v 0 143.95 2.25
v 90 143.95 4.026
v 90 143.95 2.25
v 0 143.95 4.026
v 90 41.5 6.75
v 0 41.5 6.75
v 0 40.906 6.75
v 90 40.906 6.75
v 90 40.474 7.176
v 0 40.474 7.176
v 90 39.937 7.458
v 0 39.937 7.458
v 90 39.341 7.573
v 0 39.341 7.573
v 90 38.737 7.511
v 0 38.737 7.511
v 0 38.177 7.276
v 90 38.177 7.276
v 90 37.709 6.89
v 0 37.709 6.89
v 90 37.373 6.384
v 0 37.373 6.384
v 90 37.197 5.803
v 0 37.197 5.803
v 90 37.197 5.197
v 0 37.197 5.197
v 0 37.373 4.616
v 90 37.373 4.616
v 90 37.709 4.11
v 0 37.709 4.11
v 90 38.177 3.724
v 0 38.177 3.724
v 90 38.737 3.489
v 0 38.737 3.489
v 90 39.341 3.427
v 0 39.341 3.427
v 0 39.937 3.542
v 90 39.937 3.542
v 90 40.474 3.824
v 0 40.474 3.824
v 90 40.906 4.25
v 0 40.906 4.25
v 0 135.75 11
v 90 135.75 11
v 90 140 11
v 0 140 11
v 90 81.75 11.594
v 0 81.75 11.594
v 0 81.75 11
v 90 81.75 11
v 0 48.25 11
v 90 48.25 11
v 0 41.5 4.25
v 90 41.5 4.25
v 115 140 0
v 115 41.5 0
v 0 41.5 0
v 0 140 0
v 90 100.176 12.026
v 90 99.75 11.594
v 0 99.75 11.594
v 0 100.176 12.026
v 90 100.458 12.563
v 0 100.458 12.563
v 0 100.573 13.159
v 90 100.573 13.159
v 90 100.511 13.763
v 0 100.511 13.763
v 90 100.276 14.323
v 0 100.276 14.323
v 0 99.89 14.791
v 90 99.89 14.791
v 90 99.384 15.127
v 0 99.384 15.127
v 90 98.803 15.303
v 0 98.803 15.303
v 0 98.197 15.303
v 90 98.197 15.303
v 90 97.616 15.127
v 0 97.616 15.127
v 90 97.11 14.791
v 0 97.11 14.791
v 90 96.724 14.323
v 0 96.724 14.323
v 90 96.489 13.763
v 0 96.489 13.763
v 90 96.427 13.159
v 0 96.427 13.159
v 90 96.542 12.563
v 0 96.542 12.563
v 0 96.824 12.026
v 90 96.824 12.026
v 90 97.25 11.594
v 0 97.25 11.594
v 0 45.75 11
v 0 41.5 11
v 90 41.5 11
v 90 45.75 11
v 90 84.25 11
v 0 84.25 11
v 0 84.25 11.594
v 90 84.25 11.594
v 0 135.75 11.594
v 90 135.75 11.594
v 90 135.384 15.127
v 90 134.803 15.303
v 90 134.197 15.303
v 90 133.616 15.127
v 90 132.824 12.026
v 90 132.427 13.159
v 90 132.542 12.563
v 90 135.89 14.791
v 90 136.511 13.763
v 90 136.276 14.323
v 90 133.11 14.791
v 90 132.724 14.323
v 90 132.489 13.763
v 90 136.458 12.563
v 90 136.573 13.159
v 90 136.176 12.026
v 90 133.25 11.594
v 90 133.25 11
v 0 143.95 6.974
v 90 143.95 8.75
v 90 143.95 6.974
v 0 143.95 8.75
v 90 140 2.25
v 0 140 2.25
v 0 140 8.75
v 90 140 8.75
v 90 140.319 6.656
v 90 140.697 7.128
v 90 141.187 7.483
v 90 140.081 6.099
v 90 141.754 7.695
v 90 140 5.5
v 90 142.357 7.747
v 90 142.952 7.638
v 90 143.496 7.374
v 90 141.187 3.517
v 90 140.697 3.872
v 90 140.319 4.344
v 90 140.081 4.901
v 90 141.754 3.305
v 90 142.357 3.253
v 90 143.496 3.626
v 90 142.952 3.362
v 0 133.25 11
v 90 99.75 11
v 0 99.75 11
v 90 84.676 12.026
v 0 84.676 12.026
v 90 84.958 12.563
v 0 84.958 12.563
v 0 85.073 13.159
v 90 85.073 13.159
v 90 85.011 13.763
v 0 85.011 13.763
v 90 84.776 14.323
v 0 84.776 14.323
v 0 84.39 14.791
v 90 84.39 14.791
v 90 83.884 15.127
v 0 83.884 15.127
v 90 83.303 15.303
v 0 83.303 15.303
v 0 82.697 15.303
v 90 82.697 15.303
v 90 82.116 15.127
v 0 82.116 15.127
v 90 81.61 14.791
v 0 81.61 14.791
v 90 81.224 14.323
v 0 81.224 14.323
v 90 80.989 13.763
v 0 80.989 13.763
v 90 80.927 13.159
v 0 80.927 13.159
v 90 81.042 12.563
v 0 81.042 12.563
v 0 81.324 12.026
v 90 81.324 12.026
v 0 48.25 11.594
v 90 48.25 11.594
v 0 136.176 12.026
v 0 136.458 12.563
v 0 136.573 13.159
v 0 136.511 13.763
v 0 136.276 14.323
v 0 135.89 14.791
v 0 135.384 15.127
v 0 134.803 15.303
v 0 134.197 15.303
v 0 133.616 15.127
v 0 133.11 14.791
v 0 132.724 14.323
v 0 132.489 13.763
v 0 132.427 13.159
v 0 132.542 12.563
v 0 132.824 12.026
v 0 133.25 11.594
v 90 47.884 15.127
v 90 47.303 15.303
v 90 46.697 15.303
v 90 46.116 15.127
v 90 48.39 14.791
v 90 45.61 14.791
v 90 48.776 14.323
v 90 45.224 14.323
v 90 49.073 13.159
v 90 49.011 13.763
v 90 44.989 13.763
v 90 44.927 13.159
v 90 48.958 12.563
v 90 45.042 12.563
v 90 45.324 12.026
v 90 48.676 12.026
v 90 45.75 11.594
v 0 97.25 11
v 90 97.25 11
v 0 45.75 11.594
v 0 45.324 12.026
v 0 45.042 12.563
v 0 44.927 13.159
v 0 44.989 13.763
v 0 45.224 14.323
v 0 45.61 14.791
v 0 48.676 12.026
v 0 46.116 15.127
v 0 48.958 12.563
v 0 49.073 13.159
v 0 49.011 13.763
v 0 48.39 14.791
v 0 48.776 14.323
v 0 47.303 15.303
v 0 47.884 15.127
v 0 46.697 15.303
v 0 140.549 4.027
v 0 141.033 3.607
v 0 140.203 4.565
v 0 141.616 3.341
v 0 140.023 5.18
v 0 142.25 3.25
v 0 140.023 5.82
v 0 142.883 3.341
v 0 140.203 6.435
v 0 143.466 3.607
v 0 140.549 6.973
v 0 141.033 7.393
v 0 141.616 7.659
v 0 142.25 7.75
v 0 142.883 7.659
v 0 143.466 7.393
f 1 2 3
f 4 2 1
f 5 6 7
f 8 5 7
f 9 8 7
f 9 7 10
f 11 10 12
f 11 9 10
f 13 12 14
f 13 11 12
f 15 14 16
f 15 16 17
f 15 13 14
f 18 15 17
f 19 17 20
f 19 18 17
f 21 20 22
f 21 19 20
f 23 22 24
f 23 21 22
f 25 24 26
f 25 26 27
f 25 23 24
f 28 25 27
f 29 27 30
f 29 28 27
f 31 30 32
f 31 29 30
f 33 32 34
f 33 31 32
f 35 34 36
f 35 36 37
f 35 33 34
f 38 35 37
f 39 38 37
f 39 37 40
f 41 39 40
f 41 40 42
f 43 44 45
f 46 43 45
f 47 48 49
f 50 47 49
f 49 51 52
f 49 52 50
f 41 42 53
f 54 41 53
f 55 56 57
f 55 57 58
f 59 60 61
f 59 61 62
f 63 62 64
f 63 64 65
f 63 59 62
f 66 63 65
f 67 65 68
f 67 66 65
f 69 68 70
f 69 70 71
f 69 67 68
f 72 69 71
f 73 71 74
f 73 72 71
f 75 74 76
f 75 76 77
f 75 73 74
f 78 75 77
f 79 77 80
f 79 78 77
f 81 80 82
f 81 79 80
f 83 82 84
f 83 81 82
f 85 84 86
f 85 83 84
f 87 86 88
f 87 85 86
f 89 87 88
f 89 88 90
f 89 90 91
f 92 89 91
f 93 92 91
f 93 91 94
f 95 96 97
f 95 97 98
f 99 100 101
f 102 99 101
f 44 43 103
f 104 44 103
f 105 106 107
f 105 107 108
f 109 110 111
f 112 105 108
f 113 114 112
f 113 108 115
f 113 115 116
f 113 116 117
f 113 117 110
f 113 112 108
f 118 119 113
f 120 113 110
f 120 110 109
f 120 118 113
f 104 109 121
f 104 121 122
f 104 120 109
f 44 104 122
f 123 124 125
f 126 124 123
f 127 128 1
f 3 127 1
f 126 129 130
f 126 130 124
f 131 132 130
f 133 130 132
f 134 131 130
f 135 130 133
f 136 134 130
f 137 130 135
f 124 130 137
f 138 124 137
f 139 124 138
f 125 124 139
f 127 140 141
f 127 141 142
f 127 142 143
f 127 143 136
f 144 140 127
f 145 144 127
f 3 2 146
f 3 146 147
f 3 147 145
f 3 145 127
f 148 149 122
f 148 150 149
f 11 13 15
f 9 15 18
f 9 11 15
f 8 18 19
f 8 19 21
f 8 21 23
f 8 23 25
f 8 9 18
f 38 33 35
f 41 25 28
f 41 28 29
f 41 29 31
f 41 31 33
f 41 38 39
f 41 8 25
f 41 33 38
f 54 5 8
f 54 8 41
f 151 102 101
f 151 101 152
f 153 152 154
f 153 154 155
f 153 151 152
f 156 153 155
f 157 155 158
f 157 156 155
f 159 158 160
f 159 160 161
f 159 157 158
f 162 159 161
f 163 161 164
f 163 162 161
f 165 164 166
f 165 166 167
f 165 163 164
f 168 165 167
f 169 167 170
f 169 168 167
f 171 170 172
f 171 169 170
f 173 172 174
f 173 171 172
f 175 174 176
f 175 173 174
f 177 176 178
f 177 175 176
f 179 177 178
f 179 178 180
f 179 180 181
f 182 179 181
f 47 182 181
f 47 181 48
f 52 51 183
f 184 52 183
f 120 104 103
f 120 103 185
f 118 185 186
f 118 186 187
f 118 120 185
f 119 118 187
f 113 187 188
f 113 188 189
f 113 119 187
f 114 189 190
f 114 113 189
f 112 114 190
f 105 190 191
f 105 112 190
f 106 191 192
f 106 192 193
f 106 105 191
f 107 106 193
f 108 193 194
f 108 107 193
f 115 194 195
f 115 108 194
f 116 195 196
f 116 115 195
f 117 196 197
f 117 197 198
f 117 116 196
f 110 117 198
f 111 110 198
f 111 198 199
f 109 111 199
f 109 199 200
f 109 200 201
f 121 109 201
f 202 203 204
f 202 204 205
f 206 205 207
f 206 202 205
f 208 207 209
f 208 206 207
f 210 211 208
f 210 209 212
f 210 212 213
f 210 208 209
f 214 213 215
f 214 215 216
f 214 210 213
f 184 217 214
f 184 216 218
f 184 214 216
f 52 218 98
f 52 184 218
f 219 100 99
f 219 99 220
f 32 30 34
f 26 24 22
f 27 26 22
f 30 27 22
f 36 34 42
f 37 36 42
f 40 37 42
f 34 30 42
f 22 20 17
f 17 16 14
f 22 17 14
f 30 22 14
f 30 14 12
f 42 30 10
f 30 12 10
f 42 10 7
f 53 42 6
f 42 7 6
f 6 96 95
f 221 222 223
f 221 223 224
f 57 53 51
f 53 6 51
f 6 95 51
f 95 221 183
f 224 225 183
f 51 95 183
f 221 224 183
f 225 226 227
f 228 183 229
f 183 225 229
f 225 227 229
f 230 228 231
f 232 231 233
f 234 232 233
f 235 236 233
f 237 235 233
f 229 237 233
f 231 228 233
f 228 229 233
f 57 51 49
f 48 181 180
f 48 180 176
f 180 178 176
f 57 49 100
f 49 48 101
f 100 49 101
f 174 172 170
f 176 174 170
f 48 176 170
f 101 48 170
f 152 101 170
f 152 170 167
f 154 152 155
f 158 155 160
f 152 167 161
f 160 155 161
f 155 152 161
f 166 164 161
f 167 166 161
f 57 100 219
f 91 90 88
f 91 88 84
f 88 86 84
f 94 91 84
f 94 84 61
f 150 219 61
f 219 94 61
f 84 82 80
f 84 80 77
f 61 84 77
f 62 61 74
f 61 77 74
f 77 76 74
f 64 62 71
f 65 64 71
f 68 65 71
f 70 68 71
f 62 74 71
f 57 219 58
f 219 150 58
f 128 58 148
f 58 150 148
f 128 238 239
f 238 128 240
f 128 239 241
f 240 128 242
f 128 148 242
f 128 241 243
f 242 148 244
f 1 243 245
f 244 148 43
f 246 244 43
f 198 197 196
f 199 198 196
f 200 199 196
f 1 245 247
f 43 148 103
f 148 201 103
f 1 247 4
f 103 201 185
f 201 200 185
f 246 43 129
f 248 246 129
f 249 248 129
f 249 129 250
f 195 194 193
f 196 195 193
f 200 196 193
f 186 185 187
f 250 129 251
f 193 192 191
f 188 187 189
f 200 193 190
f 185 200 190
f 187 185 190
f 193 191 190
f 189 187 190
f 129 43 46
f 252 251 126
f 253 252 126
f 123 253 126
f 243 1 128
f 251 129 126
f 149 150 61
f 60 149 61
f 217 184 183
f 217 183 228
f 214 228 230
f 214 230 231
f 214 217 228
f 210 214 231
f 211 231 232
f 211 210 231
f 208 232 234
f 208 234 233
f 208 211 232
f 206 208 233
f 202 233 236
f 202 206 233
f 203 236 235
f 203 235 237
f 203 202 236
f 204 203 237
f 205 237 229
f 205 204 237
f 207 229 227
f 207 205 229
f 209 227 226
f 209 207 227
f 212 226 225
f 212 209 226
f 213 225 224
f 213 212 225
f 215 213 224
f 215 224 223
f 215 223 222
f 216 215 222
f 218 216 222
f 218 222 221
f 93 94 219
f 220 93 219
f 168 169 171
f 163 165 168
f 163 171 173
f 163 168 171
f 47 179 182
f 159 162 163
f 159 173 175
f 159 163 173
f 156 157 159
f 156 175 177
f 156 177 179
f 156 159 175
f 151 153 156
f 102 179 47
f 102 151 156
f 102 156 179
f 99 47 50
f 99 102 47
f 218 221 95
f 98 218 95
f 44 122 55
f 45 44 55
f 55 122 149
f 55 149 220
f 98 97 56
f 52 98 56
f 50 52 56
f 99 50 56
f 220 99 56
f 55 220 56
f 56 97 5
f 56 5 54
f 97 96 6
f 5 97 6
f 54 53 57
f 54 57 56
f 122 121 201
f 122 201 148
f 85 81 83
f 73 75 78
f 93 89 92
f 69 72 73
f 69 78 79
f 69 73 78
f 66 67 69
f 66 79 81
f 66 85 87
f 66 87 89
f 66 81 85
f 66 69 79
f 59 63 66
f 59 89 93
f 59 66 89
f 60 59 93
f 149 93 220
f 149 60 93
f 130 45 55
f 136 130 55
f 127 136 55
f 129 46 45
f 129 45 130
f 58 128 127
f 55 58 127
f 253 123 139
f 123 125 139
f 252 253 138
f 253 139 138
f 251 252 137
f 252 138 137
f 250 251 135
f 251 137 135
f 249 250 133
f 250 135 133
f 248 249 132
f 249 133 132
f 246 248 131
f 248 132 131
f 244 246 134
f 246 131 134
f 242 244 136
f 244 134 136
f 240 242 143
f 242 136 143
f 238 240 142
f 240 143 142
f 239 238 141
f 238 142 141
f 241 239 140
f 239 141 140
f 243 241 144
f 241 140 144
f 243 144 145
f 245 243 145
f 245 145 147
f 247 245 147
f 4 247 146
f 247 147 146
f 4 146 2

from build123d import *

# Parameters (mm, degrees)
EXTRUDE_1_DEPTH             = 90
SKETCH_2_W                  = 90
SKETCH_2_H                  = 17.75
EXTRUDE_2_DEPTH             = 8.2
SKETCH_3_W                  = 90
SKETCH_3_H                  = 102.45
EXTRUDE_3_DEPTH             = 8.2
SKETCH_4_W                  = 3.95
SKETCH_4_H                  = 2.25
CUT_EXTRUDE_1_DEPTH         = 171.45954982
SKETCH_5_W                  = 3.95
SKETCH_5_H                  = 29.5
CUT_EXTRUDE_2_DEPTH         = 171.45954982
SKETCH_6_W                  = 3.95
SKETCH_6_H                  = 9
CUT_EXTRUDE_3_DEPTH         = 171.45954982
SKETCH_7_W                  = 3.95
SKETCH_7_H                  = 29.5
CUT_EXTRUDE_4_DEPTH         = 171.45954982
SKETCH_8_W                  = 3.95
SKETCH_8_H                  = 6.2
CUT_EXTRUDE_5_DEPTH         = 171.45954982
SKETCH_9_W                  = 2.25
SKETCH_9_H                  = 3.95
CUT_EXTRUDE_6_DEPTH         = 171.45954982
SKETCH_10_W                 = 4.5
SKETCH_10_H                 = 3.95
CUT_EXTRUDE_7_DEPTH         = 171.45954982
SKETCH_11_W                 = 2.25
SKETCH_11_H                 = 3.95
CUT_EXTRUDE_8_DEPTH         = 171.45954982
SKETCH_12_W                 = 20.2
SKETCH_12_H                 = 96.7
CUT_EXTRUDE_9_DEPTH         = 86
HOLE_WIZARD_8_3_8_3_1_D     = 8.3
HOLE_WIZARD_8_3_8_3_1_DEPTH = 3.2
HOLE_WIZARD_4_5_4_5_1_D     = 4.5
HOLE_WIZARD_2_5_2_5_1_D     = 2.5
SKETCH_19_R                 = 4.5030807
EXTRUDE_4_DEPTH             = 3
SKETCH_20_R                 = 1.649948342
SKETCH_20_R_2               = 1.660581376
SKETCH_20_R_3               = 1.430745594
SKETCH_20_R_4               = 1.573250385
SKETCH_20_R_5               = 1.502029841
SKETCH_20_R_6               = 1.53795619
EXTRUDE_5_DEPTH             = 90
CUT_EXTRUDE_10_DEPTH        = 112
CUT_EXTRUDE_10_DEPTH_BACK   = 112
EXTRUDE_6_DEPTH             = 20
EXTRUDE_6_DEPTH_BACK        = 3
SKETCH_22_W                 = 10.1
SKETCH_22_H                 = 96.7
SKETCH_23_W                 = 66
SKETCH_23_H                 = 10.1
EXTRUDE_7_DEPTH             = 10
SKETCH_24_W                 = 66
SKETCH_24_H                 = 10.1
EXTRUDE_8_DEPTH             = 10
SKETCH_25_W                 = 10.1
SKETCH_25_H                 = 76.7
EXTRUDE_9_DEPTH             = 20
SKETCH_26_W                 = 11
SKETCH_26_H                 = 98.5
EXTRUDE_10_DEPTH            = 25
CUT_EXTRUDE_13_DEPTH        = 123
EXTRUDE_11_DEPTH            = 78
EXTRUDE_11_DEPTH_BACK       = 2
SKETCH_29_W                 = 46
SKETCH_29_H                 = 10.1


with BuildPart() as part:
    # Эскиз1 → Бобышка-Вытянуть1 (new body)
    with BuildSketch(Plane(origin=(90, 0, 0), x_dir=(0, 0, -1), z_dir=(1, 0, 0))):
        with BuildLine():
            Line((6.75, 40.906238208), (6.75, 135.75))
            Line((6.75, 135.75), (-11.593761792, 135.75))
            ThreePointArc((-11.593761792, 135.75), (-15.325, 134.5), (-11.593761793, 133.25))
            Line((-11.593761793, 133.25), (-11, 133.25))
            Line((-11, 133.25), (-11, 99.75))
            Line((-11, 99.75), (-11.593761792, 99.75))
            ThreePointArc((-11.593761792, 99.75), (-15.325, 98.5), (-11.593761792, 97.25))
            Line((-11.593761792, 97.25), (-11, 97.25))
            Line((-11, 97.25), (-11, 84.25))
            Line((-11, 84.25), (-11.593761792, 84.25))
            ThreePointArc((-11.593761792, 84.25), (-15.325, 83), (-11.593761792, 81.75))
            Line((-11.593761792, 81.75), (-11, 81.75))
            Line((-11, 81.75), (-11, 48.25))
            Line((-11, 48.25), (-11.593761792, 48.25))
            ThreePointArc((-11.593761792, 48.25), (-15.325, 47), (-11.593761792, 45.75))
            Line((-11.593761792, 45.75), (-11, 45.75))
            Line((-11, 45.75), (-11, 41.5))
            Line((-11, 41.5), (-6.75, 41.5))
            Line((-6.75, 41.5), (-6.75, 40.906238208))
            ThreePointArc((-6.75, 40.906238208), (-5.5, 37.175), (-4.25, 40.906238208))
            Line((-4.25, 40.906238208), (-4.25, 41.5))
            Line((-4.25, 41.5), (4.25, 41.5))
            Line((4.25, 41.5), (4.25, 40.906238208))
            ThreePointArc((4.25, 40.906238208), (5.5, 37.175), (6.75, 40.906238208))
        make_face()
    extrude(amount=-EXTRUDE_1_DEPTH)

    # Эскиз2 → Бобышка-Вытянуть2 (add)
    with BuildSketch(Plane(origin=(0, 135.75, 0), x_dir=(-1, 0, 0), z_dir=(0, 1, 0))):
        with Locations((-45, 2.125)):
            Rectangle(SKETCH_2_W, SKETCH_2_H)
    extrude(amount=EXTRUDE_2_DEPTH)

    # Эскиз3 → Бобышка-Вытянуть3 (add)
    with BuildSketch(Plane(origin=(0, 0, -6.75), x_dir=(-1, 0, 0), z_dir=(0, 0, -1))):
        with Locations((-45, 92.725)):
            Rectangle(SKETCH_3_W, SKETCH_3_H)
    extrude(amount=EXTRUDE_3_DEPTH)

    # Эскиз4 → Вырез-Вытянуть1 (cut, through all)
    with BuildSketch(Plane.ZY):
        with Locations((-12.975, 42.625)):
            Rectangle(SKETCH_4_W, SKETCH_4_H)
    extrude(amount=-CUT_EXTRUDE_1_DEPTH, mode=Mode.SUBTRACT)

    # Эскиз5 → Вырез-Вытянуть2 (cut, through all)
    with BuildSketch(Plane.ZY):
        with Locations((-12.975, 65)):
            Rectangle(SKETCH_5_W, SKETCH_5_H)
    extrude(amount=-CUT_EXTRUDE_2_DEPTH, mode=Mode.SUBTRACT)

    # Эскиз6 → Вырез-Вытянуть3 (cut, through all)
    with BuildSketch(Plane.ZY):
        with Locations((-12.975, 90.75)):
            Rectangle(SKETCH_6_W, SKETCH_6_H)
    extrude(amount=-CUT_EXTRUDE_3_DEPTH, mode=Mode.SUBTRACT)

    # Эскиз7 → Вырез-Вытянуть4 (cut, through all)
    with BuildSketch(Plane.ZY):
        with Locations((-12.975, 116.5)):
            Rectangle(SKETCH_7_W, SKETCH_7_H)
    extrude(amount=-CUT_EXTRUDE_4_DEPTH, mode=Mode.SUBTRACT)

    # Эскиз8 → Вырез-Вытянуть5 (cut, through all)
    with BuildSketch(Plane.ZY):
        with Locations((-12.975, 140.85)):
            Rectangle(SKETCH_8_W, SKETCH_8_H)
    extrude(amount=-CUT_EXTRUDE_5_DEPTH, mode=Mode.SUBTRACT)

    # Эскиз9 → Вырез-Вытянуть6 (cut, through all)
    with BuildSketch(Plane.ZY):
        with Locations((-9.875, 141.975)):
            Rectangle(SKETCH_9_W, SKETCH_9_H)
    extrude(amount=-CUT_EXTRUDE_6_DEPTH, mode=Mode.SUBTRACT)

    # Эскиз10 → Вырез-Вытянуть7 (cut, through all)
    with BuildSketch(Plane.ZY):
        with Locations((0, 141.975)):
            Rectangle(SKETCH_10_W, SKETCH_10_H)
    extrude(amount=-CUT_EXTRUDE_7_DEPTH, mode=Mode.SUBTRACT)

    # Эскиз11 → Вырез-Вытянуть8 (cut, through all)
    with BuildSketch(Plane.ZY):
        with Locations((9.875, 141.975)):
            Rectangle(SKETCH_11_W, SKETCH_11_H)
    extrude(amount=-CUT_EXTRUDE_8_DEPTH, mode=Mode.SUBTRACT)

    # Эскиз12 → Вырез-Вытянуть9 (cut)
    with BuildSketch(Plane(origin=(90, 0, 0), x_dir=(0, 0, -1), z_dir=(1, 0, 0))):
        with Locations((0, 90.75)):
            Rectangle(SKETCH_12_W, SKETCH_12_H)
    extrude(amount=-CUT_EXTRUDE_9_DEPTH, mode=Mode.SUBTRACT)

    # Диаметр отверстия Ø8.3 (8.3)1
    with Locations(Plane.ZY):
        with Locations((0, 90)):
            Hole(HOLE_WIZARD_8_3_8_3_1_D / 2, depth=HOLE_WIZARD_8_3_8_3_1_DEPTH)

    # Диаметр отверстия Ø4.5 (4.5)1 (through all)
    with Locations(Plane.ZY):
        with Locations((-13.25, 47), (-13.25, 83), (-13.25, 98.5), (-13.25, 134.5), (-5.5, 142.25), (5.5, 142.25)):
            Hole(HOLE_WIZARD_4_5_4_5_1_D / 2)

    # Диаметр отверстия Ø2.5 (2.5)1 (through all)
    with Locations(Plane(origin=(90, 0, 0), x_dir=(0, 0, -1), z_dir=(1, 0, 0))):
        with Locations((-13.25, 98.5), (-13.25, 134.5), (-13.25, 47), (-13.25, 83), (5.5, 39.25), (-5.5, 39.25)):
            Hole(HOLE_WIZARD_2_5_2_5_1_D / 2)

    # Эскиз19 → Бобышка-Вытянуть4 (add)
    with BuildSketch(Plane.ZY):
        with Locations((0, 90)):
            Circle(SKETCH_19_R)
    extrude(amount=-EXTRUDE_4_DEPTH)

    # Эскиз20 → Бобышка-Вытянуть5 (add)
    with BuildSketch(Plane(origin=(90, 0, 0), x_dir=(0, 0, -1), z_dir=(1, 0, 0))):
        with Locations((-13.25, 134.5)):
            Circle(SKETCH_20_R)
        with Locations((-13.25, 98.5)):
            Circle(SKETCH_20_R_2)
        with Locations((-13.25, 83)):
            Circle(SKETCH_20_R_3)
        with Locations((-13.25, 47)):
            Circle(SKETCH_20_R_4)
        with Locations((-5.5, 39.25)):
            Circle(SKETCH_20_R_5)
        with Locations((5.5, 39.25)):
            Circle(SKETCH_20_R_6)
    extrude(amount=-EXTRUDE_5_DEPTH)

    # Эскиз21 → Вырез-Вытянуть10 (cut, two sides: drawn at the far end of the back side and taken through both)
    with BuildSketch(Plane(origin=(4, 0, 0), x_dir=(0, 0, -1), z_dir=(1, 0, 0)).offset(-CUT_EXTRUDE_10_DEPTH_BACK)):
        Polygon((0, 140), (0, 41.5), (0, 35.614345614), (18.747428666, 35.614345614), (18.747428666, 145.957941917), (0, 145.957941917), align=None)
    extrude(amount=CUT_EXTRUDE_10_DEPTH + CUT_EXTRUDE_10_DEPTH_BACK, mode=Mode.SUBTRACT)

    # Эскиз22 → Бобышка-Вытянуть6 (add, two sides: drawn at the far end of the back side and taken through both)
    with BuildSketch(Plane(origin=(4, 0, 0), x_dir=(0, 0, -1), z_dir=(1, 0, 0)).offset(-EXTRUDE_6_DEPTH_BACK)):
        with Locations((-5.05, 90.75)):
            Rectangle(SKETCH_22_W, SKETCH_22_H)
    extrude(amount=EXTRUDE_6_DEPTH + EXTRUDE_6_DEPTH_BACK)

    # Эскиз23 → Бобышка-Вытянуть7 (add)
    with BuildSketch(Plane.XZ.offset(-139.1)):
        with Locations((57, 5.05)):
            Rectangle(SKETCH_23_W, SKETCH_23_H)
    extrude(amount=EXTRUDE_7_DEPTH)

    # Эскиз24 → Бобышка-Вытянуть8 (add)
    with BuildSketch(Plane(origin=(0, 42.4, 0), x_dir=(1, 0, 0), z_dir=(0, 1, 0))):
        with Locations((57, -5.05)):
            Rectangle(SKETCH_24_W, SKETCH_24_H)
    extrude(amount=EXTRUDE_8_DEPTH)

    # Эскиз25 → Бобышка-Вытянуть9 (add)
    with BuildSketch(Plane(origin=(90, 0, 0), x_dir=(0, 0, -1), z_dir=(1, 0, 0))):
        with Locations((-5.05, 90.75)):
            Rectangle(SKETCH_25_W, SKETCH_25_H)
    extrude(amount=-EXTRUDE_9_DEPTH)

    # Эскиз26 → Бобышка-Вытянуть10 (add)
    with BuildSketch(Plane(origin=(90, 0, 0), x_dir=(0, 0, -1), z_dir=(1, 0, 0))):
        with Locations((-5.5, 90.75)):
            Rectangle(SKETCH_26_W, SKETCH_26_H)
    extrude(amount=EXTRUDE_10_DEPTH)

    # Эскиз27 → Вырез-Вытянуть13 (cut)
    with BuildSketch(Plane.XZ.offset(-41.5)):
        Polygon((90, 11), (115, 0), (115, 11), align=None)
    extrude(amount=-CUT_EXTRUDE_13_DEPTH, mode=Mode.SUBTRACT)

    # Эскиз29 → Бобышка-Вытянуть11 (add, two sides: drawn at the far end of the back side and taken through both)
    with BuildSketch(Plane.XZ.offset(-129.1).offset(-EXTRUDE_11_DEPTH_BACK)):
        with Locations((47, 5.05)):
            Rectangle(SKETCH_29_W, SKETCH_29_H)
    extrude(amount=EXTRUDE_11_DEPTH + EXTRUDE_11_DEPTH_BACK)


solid = part.part
